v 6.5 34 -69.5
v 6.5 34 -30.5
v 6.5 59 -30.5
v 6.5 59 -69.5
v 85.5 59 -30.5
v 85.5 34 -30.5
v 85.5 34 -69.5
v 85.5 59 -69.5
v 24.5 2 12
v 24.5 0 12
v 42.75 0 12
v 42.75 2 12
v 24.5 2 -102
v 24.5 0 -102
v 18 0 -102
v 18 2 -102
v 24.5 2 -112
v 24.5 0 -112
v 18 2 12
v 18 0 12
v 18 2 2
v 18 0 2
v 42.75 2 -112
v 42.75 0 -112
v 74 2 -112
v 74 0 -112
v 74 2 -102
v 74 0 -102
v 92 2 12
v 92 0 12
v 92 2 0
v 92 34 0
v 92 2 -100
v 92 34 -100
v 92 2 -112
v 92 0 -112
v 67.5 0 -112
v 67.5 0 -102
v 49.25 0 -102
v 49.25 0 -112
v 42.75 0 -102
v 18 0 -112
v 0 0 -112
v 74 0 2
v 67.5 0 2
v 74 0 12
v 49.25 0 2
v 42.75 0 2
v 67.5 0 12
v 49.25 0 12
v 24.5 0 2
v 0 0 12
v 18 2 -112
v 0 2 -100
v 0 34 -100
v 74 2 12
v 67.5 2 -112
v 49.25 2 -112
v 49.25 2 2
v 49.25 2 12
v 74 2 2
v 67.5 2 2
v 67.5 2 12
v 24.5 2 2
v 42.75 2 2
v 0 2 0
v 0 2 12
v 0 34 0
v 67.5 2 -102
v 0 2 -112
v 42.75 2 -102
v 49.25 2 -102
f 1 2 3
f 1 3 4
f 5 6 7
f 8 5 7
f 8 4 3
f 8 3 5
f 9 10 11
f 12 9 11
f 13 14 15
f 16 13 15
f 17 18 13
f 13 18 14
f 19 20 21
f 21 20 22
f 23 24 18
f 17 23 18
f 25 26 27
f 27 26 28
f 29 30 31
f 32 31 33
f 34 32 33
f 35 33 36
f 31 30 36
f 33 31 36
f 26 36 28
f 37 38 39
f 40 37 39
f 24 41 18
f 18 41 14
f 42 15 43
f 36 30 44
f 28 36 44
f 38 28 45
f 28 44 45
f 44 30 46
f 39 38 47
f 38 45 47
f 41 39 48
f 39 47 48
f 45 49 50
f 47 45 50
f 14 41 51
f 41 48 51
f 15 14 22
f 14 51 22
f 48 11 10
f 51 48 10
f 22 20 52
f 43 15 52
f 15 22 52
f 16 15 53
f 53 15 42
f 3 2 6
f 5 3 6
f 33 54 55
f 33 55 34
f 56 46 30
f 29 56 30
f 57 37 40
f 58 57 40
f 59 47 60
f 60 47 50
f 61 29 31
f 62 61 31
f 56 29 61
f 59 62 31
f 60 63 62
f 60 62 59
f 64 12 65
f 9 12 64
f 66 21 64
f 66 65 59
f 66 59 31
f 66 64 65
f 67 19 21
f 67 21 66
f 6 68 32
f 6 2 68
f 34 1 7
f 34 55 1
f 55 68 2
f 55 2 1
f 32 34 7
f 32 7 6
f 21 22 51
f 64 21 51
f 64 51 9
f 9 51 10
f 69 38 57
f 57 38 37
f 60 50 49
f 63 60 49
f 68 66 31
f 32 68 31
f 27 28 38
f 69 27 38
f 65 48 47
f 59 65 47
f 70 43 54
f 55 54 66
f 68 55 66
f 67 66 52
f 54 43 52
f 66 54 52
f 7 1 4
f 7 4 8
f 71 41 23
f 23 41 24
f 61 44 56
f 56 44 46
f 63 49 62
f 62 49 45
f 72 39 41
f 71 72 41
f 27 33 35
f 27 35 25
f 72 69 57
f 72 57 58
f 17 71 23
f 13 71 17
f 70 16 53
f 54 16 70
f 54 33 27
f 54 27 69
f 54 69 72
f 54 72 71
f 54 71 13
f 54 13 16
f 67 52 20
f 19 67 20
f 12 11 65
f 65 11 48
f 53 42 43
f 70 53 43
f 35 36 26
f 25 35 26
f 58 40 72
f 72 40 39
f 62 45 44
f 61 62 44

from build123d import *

# Parameters (mm, degrees)
SKETCH_1_W      = 92
SKETCH_1_H      = 100
EXTRUDE_1_DEPTH = 34
SKETCH_2_W      = 79
SKETCH_2_H      = 39
EXTRUDE_2_DEPTH = 25
EXTRUDE_3_DEPTH = 2


with BuildPart() as part:
    # Эскиз1 → Бобышка-Вытянуть1 (new body)
    with BuildSketch(Plane(origin=(0, 0, 0), x_dir=(1, 0, 0), z_dir=(0, 1, 0))):
        with Locations((46, 50)):
            Rectangle(SKETCH_1_W, SKETCH_1_H)
    extrude(amount=EXTRUDE_1_DEPTH)

    # Эскиз2 → Бобышка-Вытянуть2 (add)
    with BuildSketch(Plane(origin=(0, 34, 0), x_dir=(1, 0, 0), z_dir=(0, 1, 0))):
        with Locations((46, 50)):
            Rectangle(SKETCH_2_W, SKETCH_2_H)
    extrude(amount=EXTRUDE_2_DEPTH)

    # Эскиз3 → Бобышка-Вытянуть3 (add)
    with BuildSketch(Plane.XZ):
        Polygon((0, 12), (18, 12), (18, 2), (24.5, 2), (24.5, 12), (42.75, 12), (42.75, 2), (49.25, 2), (49.25, 12), (67.5, 12), (67.5, 2), (74, 2), (74, 12), (92, 12), (92, -112), (74, -112), (74, -102), (67.5, -102), (67.5, -112), (49.25, -112), (49.25, -102), (42.75, -102), (42.75, -112), (24.5, -112), (24.5, -102), (18, -102), (18, -112), (0, -112), align=None)
    extrude(amount=-EXTRUDE_3_DEPTH)


solid = part.part
